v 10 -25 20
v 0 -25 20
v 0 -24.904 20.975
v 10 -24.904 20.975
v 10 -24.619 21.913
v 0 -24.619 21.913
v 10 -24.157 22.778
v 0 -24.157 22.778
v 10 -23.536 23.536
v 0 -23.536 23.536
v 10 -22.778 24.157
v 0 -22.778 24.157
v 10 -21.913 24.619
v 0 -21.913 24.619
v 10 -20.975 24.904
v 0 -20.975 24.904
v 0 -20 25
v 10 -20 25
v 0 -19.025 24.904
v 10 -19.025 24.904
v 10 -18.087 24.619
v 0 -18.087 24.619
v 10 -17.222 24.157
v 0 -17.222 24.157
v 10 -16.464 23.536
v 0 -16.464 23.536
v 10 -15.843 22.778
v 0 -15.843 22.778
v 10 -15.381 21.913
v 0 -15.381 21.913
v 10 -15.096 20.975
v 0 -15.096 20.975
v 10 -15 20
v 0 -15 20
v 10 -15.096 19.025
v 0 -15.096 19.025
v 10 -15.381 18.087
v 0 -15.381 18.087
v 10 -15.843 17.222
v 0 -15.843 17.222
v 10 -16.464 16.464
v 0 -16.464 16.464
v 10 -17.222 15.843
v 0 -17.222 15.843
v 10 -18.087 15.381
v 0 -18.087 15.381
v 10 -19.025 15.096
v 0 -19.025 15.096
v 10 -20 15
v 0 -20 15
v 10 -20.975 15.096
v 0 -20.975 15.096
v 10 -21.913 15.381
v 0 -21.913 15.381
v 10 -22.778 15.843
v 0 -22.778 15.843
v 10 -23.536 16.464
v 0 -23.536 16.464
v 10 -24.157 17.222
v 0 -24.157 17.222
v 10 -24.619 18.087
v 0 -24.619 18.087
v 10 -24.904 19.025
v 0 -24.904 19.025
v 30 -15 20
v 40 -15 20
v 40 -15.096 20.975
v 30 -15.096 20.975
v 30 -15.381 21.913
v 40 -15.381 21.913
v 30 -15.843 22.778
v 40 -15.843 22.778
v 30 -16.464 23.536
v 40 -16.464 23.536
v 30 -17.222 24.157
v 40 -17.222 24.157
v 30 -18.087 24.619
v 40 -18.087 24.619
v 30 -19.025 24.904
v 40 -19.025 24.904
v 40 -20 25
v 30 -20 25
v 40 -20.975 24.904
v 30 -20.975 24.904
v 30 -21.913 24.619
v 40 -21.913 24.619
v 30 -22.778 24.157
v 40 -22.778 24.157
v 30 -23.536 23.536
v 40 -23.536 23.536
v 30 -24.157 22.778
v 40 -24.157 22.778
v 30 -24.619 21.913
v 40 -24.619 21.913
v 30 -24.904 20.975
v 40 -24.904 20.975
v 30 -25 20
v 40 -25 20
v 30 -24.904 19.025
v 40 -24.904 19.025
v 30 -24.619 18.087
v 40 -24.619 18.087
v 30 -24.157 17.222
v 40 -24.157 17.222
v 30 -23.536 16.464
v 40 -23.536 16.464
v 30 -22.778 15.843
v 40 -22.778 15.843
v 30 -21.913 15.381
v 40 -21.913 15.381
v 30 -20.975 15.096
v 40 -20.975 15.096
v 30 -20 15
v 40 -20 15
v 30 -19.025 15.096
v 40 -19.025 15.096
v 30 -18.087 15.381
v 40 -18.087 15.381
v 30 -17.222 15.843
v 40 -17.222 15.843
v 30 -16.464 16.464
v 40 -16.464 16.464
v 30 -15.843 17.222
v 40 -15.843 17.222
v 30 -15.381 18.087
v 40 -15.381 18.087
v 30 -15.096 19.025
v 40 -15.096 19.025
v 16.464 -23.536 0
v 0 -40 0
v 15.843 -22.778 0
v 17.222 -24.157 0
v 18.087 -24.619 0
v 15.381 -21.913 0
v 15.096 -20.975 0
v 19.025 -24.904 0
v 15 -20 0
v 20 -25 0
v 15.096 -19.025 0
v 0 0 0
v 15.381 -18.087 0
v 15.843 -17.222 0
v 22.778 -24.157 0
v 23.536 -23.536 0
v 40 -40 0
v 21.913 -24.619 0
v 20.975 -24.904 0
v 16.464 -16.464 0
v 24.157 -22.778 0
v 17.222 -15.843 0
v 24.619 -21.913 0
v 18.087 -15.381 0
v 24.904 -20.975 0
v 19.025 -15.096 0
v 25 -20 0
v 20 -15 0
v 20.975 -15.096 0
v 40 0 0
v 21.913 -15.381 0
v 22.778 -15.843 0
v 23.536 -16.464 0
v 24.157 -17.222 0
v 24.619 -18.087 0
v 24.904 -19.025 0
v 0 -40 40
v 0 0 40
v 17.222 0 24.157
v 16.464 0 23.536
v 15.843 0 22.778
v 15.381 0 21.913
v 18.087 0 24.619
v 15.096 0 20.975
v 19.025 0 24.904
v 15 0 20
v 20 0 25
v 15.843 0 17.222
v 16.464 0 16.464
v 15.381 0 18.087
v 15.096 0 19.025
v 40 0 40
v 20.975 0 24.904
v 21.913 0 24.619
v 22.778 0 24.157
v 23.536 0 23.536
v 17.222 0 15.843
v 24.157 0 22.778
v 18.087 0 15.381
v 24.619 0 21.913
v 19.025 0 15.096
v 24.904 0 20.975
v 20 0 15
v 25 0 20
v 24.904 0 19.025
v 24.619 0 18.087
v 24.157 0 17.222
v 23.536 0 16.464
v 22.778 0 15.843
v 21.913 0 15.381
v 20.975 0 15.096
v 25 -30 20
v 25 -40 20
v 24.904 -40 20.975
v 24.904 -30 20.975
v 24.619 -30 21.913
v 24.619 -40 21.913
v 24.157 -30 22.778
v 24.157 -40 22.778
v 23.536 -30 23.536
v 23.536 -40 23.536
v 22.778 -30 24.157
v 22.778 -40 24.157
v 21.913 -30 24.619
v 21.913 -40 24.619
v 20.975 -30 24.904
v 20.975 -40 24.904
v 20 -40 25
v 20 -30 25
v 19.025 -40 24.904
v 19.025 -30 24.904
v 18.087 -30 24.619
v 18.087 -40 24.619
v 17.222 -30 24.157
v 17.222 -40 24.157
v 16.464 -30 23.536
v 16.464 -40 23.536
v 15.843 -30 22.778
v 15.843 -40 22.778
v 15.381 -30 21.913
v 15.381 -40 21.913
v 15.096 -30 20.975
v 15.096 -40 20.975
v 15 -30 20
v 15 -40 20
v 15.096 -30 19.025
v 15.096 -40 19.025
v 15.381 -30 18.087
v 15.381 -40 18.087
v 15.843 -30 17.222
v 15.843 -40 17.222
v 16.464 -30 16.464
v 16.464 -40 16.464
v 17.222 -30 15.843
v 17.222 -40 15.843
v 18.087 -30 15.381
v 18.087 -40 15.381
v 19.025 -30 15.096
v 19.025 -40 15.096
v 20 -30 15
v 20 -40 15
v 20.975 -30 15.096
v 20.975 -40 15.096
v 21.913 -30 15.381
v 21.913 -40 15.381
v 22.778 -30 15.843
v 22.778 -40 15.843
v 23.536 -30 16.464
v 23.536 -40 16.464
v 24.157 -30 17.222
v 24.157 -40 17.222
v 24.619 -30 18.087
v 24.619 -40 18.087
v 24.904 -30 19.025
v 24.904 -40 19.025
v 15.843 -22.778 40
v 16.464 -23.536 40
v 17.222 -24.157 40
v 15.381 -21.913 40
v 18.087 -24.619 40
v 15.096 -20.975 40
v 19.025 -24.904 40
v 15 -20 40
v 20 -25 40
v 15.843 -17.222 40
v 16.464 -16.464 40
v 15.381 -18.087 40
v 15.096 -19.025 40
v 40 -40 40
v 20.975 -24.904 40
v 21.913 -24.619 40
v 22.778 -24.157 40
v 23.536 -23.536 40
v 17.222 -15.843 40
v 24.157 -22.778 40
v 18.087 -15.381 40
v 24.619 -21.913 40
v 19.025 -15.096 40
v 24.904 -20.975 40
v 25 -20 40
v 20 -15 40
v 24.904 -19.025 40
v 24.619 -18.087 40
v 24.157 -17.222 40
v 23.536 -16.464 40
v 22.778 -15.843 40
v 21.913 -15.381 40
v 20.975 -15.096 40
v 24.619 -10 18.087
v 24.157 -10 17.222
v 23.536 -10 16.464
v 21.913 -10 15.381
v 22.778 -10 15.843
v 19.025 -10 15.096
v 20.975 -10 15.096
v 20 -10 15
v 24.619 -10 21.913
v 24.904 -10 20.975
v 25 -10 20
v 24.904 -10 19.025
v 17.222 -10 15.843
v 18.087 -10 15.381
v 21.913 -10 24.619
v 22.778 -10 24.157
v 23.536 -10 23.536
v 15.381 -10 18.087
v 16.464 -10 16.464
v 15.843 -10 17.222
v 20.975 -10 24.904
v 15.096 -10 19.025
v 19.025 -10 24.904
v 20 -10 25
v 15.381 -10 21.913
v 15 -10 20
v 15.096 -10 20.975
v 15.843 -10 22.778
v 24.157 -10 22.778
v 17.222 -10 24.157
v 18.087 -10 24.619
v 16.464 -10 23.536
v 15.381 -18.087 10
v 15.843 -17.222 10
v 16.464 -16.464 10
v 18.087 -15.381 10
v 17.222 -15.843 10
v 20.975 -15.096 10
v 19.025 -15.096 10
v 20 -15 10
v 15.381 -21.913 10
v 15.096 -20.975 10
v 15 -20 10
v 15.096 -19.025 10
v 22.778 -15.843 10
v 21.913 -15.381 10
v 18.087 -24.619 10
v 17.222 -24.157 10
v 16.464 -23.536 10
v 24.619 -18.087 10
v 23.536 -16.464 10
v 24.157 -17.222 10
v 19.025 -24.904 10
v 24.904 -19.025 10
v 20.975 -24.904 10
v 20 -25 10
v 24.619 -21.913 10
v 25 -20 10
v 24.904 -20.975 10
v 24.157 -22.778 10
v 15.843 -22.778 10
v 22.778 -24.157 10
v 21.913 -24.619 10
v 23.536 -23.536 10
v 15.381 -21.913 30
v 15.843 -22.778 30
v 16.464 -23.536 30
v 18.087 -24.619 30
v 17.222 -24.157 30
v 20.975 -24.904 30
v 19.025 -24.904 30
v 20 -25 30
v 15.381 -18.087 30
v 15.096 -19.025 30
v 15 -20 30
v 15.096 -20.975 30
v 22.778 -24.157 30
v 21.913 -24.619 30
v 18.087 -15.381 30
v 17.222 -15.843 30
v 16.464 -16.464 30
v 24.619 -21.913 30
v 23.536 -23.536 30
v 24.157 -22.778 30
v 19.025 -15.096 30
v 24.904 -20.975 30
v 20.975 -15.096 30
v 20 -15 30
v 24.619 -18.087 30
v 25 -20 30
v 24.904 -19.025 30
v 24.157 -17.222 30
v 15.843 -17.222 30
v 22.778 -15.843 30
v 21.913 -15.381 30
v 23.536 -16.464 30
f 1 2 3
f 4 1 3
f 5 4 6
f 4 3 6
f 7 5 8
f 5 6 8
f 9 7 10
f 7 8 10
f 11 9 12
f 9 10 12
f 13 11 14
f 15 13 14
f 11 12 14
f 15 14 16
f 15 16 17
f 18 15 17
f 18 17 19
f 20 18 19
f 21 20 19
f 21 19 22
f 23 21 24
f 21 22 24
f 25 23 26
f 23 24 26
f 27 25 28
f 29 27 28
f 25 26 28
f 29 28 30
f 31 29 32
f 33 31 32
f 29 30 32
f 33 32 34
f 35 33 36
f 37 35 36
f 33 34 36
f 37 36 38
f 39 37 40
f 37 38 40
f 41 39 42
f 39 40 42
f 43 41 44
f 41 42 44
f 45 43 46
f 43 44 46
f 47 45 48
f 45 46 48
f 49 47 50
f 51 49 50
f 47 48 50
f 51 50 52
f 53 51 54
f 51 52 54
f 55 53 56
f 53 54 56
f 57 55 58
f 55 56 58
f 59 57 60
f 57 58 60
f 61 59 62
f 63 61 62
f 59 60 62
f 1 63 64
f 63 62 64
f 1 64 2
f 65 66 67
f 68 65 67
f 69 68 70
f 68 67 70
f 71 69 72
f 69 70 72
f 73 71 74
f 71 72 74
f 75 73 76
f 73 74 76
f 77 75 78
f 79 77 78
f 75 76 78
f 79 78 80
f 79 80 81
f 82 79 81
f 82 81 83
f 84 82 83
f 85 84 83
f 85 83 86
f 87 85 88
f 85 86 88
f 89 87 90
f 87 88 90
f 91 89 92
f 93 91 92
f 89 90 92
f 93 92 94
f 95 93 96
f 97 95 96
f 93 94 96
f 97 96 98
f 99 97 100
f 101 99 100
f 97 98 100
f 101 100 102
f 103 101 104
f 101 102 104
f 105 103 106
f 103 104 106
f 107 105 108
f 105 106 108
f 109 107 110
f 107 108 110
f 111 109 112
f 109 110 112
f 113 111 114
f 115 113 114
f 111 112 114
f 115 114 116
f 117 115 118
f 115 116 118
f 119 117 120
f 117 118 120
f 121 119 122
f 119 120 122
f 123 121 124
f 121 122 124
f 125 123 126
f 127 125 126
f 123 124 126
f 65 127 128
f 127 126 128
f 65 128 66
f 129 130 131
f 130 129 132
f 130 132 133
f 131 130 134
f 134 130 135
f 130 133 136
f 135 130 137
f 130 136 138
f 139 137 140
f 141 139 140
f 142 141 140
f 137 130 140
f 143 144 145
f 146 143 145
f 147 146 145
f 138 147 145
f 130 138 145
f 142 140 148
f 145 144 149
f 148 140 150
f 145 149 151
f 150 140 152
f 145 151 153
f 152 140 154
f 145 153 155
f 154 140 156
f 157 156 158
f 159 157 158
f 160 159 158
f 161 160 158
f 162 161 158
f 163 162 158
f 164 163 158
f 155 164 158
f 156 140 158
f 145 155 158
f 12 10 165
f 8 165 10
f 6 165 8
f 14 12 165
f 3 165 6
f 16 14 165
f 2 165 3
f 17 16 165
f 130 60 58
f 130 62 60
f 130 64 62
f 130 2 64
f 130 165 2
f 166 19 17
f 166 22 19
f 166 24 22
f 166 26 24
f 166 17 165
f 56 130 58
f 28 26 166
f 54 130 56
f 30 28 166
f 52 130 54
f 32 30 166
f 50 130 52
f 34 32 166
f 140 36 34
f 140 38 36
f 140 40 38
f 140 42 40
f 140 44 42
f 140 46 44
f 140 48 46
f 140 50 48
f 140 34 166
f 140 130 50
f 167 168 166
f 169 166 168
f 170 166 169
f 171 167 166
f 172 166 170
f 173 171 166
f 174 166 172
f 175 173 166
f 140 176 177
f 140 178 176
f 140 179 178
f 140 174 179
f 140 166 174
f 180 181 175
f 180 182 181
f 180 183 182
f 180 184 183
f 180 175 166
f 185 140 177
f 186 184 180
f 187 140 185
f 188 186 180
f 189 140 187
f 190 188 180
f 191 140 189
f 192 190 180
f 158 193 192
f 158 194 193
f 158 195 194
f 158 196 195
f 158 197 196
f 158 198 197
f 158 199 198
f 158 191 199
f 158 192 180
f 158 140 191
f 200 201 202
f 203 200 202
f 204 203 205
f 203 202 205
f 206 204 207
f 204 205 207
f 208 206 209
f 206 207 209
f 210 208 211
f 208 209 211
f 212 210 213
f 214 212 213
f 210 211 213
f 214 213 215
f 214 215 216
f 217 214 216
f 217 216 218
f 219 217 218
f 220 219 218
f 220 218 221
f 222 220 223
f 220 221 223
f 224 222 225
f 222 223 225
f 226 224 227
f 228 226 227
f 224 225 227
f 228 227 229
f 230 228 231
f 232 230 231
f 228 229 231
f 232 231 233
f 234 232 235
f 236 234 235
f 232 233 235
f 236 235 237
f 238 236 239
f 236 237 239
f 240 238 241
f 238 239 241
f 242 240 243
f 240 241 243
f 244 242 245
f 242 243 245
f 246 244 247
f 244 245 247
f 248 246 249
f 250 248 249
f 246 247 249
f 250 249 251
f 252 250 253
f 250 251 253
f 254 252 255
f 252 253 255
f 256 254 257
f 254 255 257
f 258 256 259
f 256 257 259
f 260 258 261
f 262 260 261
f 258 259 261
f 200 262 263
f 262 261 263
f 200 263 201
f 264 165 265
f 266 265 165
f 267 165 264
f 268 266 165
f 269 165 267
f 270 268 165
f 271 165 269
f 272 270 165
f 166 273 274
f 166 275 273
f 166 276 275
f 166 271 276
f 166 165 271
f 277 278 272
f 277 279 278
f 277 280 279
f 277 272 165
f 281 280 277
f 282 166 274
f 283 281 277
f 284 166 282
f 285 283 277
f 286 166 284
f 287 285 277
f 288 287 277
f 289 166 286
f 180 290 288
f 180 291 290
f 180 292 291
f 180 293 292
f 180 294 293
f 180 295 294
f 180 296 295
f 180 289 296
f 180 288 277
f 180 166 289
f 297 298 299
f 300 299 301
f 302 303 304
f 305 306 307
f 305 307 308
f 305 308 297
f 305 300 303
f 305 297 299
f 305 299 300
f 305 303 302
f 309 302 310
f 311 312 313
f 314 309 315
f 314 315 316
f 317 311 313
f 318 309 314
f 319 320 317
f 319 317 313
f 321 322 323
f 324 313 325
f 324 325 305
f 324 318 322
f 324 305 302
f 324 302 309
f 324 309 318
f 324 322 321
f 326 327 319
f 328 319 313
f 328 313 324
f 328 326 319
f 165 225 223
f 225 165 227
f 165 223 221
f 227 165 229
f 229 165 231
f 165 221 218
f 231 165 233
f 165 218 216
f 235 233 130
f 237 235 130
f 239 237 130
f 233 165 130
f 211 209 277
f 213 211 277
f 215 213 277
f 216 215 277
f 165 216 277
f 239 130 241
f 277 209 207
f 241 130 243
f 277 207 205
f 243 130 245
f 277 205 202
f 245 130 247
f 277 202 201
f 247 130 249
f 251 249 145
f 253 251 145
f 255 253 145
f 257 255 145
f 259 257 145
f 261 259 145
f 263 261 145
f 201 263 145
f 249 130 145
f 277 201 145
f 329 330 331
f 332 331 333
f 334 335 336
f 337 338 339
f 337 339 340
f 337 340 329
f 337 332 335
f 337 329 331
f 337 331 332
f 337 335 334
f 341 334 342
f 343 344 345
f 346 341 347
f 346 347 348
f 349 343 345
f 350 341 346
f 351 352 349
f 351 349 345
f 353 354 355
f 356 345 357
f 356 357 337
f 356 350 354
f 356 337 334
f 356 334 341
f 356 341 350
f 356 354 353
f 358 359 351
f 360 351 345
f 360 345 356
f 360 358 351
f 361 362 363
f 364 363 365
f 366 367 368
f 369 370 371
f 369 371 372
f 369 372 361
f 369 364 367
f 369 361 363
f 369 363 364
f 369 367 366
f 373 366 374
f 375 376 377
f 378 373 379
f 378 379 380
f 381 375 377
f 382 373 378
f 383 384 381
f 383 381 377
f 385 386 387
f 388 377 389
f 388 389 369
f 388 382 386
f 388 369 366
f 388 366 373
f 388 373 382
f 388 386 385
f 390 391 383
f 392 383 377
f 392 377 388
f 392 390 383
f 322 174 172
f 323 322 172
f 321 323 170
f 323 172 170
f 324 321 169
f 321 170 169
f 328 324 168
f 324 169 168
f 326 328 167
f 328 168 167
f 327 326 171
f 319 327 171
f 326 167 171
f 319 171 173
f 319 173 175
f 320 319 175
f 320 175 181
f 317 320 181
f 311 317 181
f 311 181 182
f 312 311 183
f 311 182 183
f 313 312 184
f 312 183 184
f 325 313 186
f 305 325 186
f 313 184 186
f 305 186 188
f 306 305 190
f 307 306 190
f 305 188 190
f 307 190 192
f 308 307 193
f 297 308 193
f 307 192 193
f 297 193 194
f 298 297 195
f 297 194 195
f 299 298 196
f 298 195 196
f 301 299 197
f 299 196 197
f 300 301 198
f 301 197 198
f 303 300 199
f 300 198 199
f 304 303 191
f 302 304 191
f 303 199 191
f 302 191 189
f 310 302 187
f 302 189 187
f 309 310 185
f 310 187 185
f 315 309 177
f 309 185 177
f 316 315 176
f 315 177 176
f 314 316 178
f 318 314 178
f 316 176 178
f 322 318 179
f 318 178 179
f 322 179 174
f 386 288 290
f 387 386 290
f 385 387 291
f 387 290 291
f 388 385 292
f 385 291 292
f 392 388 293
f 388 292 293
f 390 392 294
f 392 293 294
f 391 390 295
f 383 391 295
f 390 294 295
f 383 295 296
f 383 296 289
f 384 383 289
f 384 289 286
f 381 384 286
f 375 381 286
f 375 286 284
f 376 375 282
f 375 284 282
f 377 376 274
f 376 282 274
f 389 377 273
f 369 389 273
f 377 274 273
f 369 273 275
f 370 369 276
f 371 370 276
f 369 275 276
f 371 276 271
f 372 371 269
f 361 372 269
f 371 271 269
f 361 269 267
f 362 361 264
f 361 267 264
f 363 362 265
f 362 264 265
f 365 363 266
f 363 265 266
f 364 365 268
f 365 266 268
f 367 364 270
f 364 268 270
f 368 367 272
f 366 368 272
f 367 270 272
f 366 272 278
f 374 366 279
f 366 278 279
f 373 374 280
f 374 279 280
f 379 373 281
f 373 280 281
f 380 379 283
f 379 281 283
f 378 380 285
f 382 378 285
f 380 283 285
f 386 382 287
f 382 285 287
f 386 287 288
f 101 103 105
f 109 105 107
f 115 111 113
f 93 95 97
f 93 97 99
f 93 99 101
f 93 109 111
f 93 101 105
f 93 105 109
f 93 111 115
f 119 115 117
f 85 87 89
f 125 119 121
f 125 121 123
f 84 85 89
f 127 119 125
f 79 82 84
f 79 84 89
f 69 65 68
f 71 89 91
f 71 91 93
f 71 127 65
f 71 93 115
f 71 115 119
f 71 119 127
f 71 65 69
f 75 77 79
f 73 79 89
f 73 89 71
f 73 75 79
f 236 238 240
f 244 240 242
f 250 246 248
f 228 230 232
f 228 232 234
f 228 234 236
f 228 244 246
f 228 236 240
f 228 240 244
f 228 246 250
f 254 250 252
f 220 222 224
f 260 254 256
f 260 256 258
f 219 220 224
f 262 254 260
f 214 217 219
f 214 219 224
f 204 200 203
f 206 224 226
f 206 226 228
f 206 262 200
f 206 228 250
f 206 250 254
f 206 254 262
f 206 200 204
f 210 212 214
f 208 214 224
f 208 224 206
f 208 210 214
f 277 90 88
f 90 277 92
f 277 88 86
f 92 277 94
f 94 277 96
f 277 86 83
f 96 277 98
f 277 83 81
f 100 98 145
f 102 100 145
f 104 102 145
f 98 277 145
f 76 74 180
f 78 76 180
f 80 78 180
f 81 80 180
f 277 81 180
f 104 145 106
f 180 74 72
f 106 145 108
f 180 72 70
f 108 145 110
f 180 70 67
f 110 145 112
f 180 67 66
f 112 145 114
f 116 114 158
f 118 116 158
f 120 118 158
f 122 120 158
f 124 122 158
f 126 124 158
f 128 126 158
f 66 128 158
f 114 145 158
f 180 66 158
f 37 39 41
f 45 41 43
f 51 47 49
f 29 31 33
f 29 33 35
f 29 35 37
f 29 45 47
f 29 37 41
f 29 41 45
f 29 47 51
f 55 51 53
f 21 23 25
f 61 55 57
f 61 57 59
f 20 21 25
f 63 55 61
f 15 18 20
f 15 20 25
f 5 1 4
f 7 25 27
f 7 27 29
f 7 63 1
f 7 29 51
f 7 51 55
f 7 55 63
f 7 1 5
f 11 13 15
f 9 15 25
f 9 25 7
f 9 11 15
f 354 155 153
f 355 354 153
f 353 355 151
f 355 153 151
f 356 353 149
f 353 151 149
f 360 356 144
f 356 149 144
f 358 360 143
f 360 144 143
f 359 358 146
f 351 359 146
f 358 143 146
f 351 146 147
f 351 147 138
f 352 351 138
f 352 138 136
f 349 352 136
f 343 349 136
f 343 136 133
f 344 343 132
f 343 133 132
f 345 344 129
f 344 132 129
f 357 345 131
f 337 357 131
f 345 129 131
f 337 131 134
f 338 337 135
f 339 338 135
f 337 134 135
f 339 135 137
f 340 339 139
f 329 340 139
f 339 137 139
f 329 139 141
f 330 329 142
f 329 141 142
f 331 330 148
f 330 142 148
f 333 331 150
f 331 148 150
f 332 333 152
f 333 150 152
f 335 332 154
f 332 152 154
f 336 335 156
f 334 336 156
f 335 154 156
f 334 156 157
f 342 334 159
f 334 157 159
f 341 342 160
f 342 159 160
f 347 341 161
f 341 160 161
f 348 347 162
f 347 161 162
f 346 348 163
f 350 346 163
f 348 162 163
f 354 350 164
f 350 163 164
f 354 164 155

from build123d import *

# Parameters (mm, degrees)
F0_W      = 40
F0_H      = 40
F1_DEPTH  = 40
F2_R      = 5
F3_DEPTH  = 10
F4_R      = 5
F5_DEPTH  = 10
F6_R      = 5
F7_DEPTH  = 10
F8_R      = 5
F9_DEPTH  = 10
F10_R     = 5
F11_DEPTH = 10
F12_R     = 5
F13_DEPTH = 10


with BuildPart() as f1:
    # F0 (on Top) → F1 (new body)
    with BuildSketch(Plane.XY):
        with Locations((20, -20)):
            Rectangle(F0_W, F0_H)
    extrude(amount=F1_DEPTH)

    # F2 (on face) → F3 (cut)
    with BuildSketch(Plane.XY.offset(40)):
        with Locations((20, -20)):
            Circle(F2_R)
    extrude(amount=-F3_DEPTH, mode=Mode.SUBTRACT)

    # F4 (on face) → F5 (cut)
    with BuildSketch(Plane(origin=(0, 0, 0), x_dir=(-1, 0, 0), z_dir=(0, 1, 0))):
        with Locations((-20, 20)):
            Circle(F4_R)
    extrude(amount=-F5_DEPTH, mode=Mode.SUBTRACT)

    # F6 (on face) → F7 (cut)
    with BuildSketch(Plane(origin=(0, 0, 0), x_dir=(1, 0, 0), z_dir=(0, 0, -1))):
        with Locations((20, 20)):
            Circle(F6_R)
    extrude(amount=-F7_DEPTH, mode=Mode.SUBTRACT)

    # F8 (on face) → F9 (cut)
    with BuildSketch(Plane.XZ.offset(40)):
        with Locations((20, 20)):
            Circle(F8_R)
    extrude(amount=-F9_DEPTH, mode=Mode.SUBTRACT)

    # F10 (on face) → F11 (cut)
    with BuildSketch(Plane.YZ.offset(40)):
        with Locations((-20, 20)):
            Circle(F10_R)
    extrude(amount=-F11_DEPTH, mode=Mode.SUBTRACT)

    # F12 (on face) → F13 (cut)
    with BuildSketch(Plane(origin=(0, 0, 0), x_dir=(0, -1, 0), z_dir=(-1, 0, 0))):
        with Locations((20, 20)):
            Circle(F12_R)
    extrude(amount=-F13_DEPTH, mode=Mode.SUBTRACT)


solid = f1.part
